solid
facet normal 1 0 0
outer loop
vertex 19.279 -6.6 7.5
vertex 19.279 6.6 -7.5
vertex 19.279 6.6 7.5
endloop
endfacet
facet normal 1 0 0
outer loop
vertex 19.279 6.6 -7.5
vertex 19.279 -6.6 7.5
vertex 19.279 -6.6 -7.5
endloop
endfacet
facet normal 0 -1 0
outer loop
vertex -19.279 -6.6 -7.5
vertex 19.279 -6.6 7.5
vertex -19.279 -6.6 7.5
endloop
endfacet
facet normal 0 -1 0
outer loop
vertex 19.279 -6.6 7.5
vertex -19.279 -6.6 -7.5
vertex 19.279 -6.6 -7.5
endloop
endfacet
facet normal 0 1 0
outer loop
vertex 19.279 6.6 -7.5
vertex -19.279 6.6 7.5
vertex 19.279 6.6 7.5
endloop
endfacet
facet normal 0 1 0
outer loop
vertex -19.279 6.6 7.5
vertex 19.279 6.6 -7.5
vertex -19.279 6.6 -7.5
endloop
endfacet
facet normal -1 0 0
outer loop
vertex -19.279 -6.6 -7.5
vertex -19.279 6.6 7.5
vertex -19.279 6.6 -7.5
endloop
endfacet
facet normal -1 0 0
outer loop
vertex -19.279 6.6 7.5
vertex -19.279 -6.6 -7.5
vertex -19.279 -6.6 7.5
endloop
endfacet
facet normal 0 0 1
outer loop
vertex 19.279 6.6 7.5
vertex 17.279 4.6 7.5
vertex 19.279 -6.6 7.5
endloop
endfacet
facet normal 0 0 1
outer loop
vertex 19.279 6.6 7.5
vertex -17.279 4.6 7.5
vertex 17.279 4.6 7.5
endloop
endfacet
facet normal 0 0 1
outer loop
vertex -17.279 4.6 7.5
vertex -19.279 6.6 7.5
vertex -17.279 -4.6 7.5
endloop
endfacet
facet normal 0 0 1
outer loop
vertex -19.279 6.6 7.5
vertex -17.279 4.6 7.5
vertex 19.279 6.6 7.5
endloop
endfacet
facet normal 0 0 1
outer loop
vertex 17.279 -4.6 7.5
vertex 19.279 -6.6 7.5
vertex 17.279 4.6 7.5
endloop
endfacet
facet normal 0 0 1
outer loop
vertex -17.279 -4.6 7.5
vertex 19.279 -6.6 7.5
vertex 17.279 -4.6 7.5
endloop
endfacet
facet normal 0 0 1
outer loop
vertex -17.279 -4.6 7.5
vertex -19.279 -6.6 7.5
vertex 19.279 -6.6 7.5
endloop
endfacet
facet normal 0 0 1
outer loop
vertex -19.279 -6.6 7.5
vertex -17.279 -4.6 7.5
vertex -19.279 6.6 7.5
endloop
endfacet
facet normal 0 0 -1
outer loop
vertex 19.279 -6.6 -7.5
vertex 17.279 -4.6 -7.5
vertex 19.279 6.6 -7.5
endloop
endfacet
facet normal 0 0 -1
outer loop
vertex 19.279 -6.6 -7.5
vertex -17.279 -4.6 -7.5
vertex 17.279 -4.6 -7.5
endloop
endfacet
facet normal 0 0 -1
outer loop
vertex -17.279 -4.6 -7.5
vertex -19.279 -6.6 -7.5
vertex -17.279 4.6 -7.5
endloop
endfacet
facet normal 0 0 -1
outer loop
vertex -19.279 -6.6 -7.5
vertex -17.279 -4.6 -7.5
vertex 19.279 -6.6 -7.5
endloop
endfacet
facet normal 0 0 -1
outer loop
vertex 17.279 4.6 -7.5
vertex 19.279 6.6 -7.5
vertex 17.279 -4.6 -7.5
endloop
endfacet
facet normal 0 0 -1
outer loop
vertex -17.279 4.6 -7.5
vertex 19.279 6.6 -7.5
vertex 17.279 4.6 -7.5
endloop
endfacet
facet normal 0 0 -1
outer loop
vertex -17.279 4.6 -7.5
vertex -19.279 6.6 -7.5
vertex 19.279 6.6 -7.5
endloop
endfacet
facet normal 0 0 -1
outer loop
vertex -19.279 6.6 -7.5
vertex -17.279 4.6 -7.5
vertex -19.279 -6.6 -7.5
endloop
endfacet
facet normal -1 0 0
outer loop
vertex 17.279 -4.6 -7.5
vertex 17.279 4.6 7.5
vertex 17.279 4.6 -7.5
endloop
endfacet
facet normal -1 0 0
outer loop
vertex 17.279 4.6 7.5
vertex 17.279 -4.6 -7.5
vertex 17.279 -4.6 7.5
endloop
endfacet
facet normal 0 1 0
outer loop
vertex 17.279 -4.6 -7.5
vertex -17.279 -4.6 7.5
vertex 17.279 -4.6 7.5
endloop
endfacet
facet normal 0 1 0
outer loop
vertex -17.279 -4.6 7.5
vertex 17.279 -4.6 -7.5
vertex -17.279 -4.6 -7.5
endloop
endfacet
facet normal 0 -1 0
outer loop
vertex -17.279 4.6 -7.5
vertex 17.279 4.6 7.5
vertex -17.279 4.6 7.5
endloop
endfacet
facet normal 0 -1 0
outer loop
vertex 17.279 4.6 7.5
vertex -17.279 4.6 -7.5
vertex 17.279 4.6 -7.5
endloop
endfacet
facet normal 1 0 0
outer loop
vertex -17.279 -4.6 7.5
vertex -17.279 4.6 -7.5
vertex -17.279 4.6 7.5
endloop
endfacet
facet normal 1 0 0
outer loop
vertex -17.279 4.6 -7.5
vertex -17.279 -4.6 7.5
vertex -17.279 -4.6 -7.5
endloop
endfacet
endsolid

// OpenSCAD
//Customizable Belt Clip
//Author: Kimberly Schumann
//2/13/2015
//Licensed under
////////////////////Parameters////////////////////
//The width across your waist y
width=15.0;
//The thickness of your belt strap z
thickness=4.0;
//The height of your belt x
height=30.05;
//The thickness of the belt clip
shell_thickness=2.0;
//The number of x pixels in your image
pixels_in_x=100;
//The number of y pixels in your image
pixels_in_y=100;
//Height of the image relief in millimeters
scale=3;
//Choose your image
design="design3.dat"; //[image_surface:100x100]
/*[Hidden]*/
ep=0+0.01;
tolerance=0.15;
inner_height=(1+tolerance)*height;
outer_height=inner_height+2*shell_thickness;

////////////////////Main()////////////////////
rotate([90,0,0])
	difference(){
		union(){		
			outside();
			image(design);
			}
		inside();
		}
	
////////////////////Functions////////////////////
module outside(){
	cube([outer_height,width,2*(1+tolerance)*thickness+2*shell_thickness,], center=true);	
	}
module inside(){
	#cube([inner_height,width+2*ep,2*(1+tolerance)*thickness], center=true);
	}
module image(name){
	translate([0,0,thickness+shell_thickness+0.5])
		scale([(outer_height)/(pixels_in_x-1),width/(pixels_in_y-1),scale])
			surface(file=name,center=true);
	}
